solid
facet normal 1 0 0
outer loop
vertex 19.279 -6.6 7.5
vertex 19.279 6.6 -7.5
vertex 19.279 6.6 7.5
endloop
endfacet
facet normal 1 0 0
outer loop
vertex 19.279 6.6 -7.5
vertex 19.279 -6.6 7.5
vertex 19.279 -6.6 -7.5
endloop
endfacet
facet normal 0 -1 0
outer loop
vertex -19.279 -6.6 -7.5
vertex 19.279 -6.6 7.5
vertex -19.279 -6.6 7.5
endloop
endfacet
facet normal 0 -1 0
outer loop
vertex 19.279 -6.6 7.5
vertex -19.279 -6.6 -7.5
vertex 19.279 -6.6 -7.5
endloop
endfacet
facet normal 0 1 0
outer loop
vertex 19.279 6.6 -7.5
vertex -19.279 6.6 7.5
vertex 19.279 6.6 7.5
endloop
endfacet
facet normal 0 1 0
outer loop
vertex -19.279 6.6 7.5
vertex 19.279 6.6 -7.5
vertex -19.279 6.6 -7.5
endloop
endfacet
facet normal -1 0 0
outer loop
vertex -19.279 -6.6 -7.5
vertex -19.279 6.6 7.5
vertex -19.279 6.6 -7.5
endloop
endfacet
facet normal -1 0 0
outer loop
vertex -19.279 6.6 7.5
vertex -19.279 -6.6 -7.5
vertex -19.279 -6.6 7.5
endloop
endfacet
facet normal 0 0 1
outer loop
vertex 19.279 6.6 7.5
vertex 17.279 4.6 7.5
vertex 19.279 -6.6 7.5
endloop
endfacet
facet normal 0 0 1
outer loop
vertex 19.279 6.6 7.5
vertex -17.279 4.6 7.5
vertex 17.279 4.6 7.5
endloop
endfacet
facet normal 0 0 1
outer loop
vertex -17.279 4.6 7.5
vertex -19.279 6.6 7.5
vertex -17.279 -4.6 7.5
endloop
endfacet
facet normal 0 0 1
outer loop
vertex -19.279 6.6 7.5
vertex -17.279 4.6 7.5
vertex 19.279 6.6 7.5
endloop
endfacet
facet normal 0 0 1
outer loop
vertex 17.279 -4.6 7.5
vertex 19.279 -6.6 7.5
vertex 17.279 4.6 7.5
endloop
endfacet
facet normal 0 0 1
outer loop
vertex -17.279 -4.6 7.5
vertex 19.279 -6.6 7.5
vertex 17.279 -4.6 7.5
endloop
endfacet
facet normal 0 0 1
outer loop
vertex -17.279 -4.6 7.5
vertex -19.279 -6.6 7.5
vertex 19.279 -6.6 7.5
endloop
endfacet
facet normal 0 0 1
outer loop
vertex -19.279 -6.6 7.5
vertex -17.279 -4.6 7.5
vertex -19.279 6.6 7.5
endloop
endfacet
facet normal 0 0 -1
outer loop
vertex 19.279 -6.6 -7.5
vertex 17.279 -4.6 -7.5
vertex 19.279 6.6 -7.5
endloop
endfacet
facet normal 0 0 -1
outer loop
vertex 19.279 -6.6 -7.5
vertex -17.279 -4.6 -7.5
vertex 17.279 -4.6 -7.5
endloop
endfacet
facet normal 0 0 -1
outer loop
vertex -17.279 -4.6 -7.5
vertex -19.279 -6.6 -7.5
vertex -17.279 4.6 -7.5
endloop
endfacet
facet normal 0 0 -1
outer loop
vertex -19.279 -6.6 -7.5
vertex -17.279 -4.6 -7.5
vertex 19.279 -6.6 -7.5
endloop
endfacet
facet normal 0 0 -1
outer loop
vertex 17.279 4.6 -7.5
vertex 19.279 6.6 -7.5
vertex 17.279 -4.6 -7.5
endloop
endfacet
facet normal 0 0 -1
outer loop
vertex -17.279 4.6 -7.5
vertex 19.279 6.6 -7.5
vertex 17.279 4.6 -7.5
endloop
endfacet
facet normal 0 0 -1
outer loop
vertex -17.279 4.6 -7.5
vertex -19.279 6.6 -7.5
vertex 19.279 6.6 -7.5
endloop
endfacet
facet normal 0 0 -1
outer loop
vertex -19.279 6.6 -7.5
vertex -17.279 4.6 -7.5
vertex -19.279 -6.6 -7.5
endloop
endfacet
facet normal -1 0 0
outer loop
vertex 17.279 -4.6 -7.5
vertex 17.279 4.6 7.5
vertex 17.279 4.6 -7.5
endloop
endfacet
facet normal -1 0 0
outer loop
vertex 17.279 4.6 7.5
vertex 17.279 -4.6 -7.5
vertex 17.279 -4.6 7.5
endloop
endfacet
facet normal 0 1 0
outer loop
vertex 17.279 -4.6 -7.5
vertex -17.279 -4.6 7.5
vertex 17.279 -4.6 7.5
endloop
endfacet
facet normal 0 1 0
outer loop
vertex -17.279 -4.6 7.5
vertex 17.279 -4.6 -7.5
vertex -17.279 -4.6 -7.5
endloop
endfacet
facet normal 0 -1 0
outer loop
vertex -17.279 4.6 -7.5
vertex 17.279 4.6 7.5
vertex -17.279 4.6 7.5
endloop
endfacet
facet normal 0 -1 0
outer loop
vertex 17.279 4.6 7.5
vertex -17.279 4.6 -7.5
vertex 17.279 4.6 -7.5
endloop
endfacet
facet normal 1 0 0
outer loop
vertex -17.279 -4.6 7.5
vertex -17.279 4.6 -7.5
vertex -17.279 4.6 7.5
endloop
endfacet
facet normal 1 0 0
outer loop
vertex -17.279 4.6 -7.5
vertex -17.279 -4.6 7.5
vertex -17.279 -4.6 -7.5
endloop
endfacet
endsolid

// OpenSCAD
//Customizable Belt Clip
//Author: Kimberly Schumann
//2/13/2015
//Licensed under
////////////////////Parameters////////////////////
//The width across your waist y
width=15.0;
//The thickness of your belt strap z
thickness=4.0;
//The height of your belt x
height=30.05;
//The thickness of the belt clip
shell_thickness=2.0;
//The number of x pixels in your image
pixels_in_x=100;
//The number of y pixels in your image
pixels_in_y=100;
//Height of the image relief in millimeters
scale=3;
//Choose your image
design="design3.dat"; //[image_surface:100x100]
/*[Hidden]*/
ep=0+0.01;
tolerance=0.15;
inner_height=(1+tolerance)*height;
outer_height=inner_height+2*shell_thickness;

////////////////////Main()////////////////////
rotate([90,0,0])
	difference(){
		union(){		
			outside();
			image(design);
			}
		inside();
		}
	
////////////////////Functions////////////////////
module outside(){
	cube([outer_height,width,2*(1+tolerance)*thickness+2*shell_thickness,], center=true);	
	}
module inside(){
	#cube([inner_height,width+2*ep,2*(1+tolerance)*thickness], center=true);
	}
module image(name){
	translate([0,0,thickness+shell_thickness+0.5])
		scale([(outer_height)/(pixels_in_x-1),width/(pixels_in_y-1),scale])
			surface(file=name,center=true);
	}
